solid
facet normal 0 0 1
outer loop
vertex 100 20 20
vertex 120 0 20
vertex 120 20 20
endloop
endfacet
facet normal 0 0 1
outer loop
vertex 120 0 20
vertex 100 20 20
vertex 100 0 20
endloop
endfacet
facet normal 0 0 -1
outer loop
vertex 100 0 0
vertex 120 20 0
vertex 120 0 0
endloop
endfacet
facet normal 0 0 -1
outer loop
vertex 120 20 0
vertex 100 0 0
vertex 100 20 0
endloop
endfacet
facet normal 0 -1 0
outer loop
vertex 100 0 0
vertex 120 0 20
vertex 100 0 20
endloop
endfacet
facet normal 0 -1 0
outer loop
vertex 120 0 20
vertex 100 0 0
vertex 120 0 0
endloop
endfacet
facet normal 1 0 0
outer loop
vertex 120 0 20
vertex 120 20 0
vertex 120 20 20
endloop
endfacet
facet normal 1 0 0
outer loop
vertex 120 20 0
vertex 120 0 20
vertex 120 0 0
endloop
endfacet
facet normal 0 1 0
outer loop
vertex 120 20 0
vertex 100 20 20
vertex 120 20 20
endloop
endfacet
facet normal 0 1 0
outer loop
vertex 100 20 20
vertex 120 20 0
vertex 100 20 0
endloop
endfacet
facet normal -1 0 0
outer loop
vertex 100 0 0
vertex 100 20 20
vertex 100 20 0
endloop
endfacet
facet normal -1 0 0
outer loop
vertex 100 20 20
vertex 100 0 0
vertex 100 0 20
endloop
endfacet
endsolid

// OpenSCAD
// file: private.scad
function base_radius() = 1.25;

// This definition is available to shapes.scad, but is not re-exported.
module private_shape() {
    cube(1);
}
// main file
use <private.scad>

shift = 2;

module used_shape() {
    translate([shift, 0, 0]) sphere(base_radius());
}

// A use statement must not execute top-level geometry.
translate([100, 0, 0]) cube(20);
